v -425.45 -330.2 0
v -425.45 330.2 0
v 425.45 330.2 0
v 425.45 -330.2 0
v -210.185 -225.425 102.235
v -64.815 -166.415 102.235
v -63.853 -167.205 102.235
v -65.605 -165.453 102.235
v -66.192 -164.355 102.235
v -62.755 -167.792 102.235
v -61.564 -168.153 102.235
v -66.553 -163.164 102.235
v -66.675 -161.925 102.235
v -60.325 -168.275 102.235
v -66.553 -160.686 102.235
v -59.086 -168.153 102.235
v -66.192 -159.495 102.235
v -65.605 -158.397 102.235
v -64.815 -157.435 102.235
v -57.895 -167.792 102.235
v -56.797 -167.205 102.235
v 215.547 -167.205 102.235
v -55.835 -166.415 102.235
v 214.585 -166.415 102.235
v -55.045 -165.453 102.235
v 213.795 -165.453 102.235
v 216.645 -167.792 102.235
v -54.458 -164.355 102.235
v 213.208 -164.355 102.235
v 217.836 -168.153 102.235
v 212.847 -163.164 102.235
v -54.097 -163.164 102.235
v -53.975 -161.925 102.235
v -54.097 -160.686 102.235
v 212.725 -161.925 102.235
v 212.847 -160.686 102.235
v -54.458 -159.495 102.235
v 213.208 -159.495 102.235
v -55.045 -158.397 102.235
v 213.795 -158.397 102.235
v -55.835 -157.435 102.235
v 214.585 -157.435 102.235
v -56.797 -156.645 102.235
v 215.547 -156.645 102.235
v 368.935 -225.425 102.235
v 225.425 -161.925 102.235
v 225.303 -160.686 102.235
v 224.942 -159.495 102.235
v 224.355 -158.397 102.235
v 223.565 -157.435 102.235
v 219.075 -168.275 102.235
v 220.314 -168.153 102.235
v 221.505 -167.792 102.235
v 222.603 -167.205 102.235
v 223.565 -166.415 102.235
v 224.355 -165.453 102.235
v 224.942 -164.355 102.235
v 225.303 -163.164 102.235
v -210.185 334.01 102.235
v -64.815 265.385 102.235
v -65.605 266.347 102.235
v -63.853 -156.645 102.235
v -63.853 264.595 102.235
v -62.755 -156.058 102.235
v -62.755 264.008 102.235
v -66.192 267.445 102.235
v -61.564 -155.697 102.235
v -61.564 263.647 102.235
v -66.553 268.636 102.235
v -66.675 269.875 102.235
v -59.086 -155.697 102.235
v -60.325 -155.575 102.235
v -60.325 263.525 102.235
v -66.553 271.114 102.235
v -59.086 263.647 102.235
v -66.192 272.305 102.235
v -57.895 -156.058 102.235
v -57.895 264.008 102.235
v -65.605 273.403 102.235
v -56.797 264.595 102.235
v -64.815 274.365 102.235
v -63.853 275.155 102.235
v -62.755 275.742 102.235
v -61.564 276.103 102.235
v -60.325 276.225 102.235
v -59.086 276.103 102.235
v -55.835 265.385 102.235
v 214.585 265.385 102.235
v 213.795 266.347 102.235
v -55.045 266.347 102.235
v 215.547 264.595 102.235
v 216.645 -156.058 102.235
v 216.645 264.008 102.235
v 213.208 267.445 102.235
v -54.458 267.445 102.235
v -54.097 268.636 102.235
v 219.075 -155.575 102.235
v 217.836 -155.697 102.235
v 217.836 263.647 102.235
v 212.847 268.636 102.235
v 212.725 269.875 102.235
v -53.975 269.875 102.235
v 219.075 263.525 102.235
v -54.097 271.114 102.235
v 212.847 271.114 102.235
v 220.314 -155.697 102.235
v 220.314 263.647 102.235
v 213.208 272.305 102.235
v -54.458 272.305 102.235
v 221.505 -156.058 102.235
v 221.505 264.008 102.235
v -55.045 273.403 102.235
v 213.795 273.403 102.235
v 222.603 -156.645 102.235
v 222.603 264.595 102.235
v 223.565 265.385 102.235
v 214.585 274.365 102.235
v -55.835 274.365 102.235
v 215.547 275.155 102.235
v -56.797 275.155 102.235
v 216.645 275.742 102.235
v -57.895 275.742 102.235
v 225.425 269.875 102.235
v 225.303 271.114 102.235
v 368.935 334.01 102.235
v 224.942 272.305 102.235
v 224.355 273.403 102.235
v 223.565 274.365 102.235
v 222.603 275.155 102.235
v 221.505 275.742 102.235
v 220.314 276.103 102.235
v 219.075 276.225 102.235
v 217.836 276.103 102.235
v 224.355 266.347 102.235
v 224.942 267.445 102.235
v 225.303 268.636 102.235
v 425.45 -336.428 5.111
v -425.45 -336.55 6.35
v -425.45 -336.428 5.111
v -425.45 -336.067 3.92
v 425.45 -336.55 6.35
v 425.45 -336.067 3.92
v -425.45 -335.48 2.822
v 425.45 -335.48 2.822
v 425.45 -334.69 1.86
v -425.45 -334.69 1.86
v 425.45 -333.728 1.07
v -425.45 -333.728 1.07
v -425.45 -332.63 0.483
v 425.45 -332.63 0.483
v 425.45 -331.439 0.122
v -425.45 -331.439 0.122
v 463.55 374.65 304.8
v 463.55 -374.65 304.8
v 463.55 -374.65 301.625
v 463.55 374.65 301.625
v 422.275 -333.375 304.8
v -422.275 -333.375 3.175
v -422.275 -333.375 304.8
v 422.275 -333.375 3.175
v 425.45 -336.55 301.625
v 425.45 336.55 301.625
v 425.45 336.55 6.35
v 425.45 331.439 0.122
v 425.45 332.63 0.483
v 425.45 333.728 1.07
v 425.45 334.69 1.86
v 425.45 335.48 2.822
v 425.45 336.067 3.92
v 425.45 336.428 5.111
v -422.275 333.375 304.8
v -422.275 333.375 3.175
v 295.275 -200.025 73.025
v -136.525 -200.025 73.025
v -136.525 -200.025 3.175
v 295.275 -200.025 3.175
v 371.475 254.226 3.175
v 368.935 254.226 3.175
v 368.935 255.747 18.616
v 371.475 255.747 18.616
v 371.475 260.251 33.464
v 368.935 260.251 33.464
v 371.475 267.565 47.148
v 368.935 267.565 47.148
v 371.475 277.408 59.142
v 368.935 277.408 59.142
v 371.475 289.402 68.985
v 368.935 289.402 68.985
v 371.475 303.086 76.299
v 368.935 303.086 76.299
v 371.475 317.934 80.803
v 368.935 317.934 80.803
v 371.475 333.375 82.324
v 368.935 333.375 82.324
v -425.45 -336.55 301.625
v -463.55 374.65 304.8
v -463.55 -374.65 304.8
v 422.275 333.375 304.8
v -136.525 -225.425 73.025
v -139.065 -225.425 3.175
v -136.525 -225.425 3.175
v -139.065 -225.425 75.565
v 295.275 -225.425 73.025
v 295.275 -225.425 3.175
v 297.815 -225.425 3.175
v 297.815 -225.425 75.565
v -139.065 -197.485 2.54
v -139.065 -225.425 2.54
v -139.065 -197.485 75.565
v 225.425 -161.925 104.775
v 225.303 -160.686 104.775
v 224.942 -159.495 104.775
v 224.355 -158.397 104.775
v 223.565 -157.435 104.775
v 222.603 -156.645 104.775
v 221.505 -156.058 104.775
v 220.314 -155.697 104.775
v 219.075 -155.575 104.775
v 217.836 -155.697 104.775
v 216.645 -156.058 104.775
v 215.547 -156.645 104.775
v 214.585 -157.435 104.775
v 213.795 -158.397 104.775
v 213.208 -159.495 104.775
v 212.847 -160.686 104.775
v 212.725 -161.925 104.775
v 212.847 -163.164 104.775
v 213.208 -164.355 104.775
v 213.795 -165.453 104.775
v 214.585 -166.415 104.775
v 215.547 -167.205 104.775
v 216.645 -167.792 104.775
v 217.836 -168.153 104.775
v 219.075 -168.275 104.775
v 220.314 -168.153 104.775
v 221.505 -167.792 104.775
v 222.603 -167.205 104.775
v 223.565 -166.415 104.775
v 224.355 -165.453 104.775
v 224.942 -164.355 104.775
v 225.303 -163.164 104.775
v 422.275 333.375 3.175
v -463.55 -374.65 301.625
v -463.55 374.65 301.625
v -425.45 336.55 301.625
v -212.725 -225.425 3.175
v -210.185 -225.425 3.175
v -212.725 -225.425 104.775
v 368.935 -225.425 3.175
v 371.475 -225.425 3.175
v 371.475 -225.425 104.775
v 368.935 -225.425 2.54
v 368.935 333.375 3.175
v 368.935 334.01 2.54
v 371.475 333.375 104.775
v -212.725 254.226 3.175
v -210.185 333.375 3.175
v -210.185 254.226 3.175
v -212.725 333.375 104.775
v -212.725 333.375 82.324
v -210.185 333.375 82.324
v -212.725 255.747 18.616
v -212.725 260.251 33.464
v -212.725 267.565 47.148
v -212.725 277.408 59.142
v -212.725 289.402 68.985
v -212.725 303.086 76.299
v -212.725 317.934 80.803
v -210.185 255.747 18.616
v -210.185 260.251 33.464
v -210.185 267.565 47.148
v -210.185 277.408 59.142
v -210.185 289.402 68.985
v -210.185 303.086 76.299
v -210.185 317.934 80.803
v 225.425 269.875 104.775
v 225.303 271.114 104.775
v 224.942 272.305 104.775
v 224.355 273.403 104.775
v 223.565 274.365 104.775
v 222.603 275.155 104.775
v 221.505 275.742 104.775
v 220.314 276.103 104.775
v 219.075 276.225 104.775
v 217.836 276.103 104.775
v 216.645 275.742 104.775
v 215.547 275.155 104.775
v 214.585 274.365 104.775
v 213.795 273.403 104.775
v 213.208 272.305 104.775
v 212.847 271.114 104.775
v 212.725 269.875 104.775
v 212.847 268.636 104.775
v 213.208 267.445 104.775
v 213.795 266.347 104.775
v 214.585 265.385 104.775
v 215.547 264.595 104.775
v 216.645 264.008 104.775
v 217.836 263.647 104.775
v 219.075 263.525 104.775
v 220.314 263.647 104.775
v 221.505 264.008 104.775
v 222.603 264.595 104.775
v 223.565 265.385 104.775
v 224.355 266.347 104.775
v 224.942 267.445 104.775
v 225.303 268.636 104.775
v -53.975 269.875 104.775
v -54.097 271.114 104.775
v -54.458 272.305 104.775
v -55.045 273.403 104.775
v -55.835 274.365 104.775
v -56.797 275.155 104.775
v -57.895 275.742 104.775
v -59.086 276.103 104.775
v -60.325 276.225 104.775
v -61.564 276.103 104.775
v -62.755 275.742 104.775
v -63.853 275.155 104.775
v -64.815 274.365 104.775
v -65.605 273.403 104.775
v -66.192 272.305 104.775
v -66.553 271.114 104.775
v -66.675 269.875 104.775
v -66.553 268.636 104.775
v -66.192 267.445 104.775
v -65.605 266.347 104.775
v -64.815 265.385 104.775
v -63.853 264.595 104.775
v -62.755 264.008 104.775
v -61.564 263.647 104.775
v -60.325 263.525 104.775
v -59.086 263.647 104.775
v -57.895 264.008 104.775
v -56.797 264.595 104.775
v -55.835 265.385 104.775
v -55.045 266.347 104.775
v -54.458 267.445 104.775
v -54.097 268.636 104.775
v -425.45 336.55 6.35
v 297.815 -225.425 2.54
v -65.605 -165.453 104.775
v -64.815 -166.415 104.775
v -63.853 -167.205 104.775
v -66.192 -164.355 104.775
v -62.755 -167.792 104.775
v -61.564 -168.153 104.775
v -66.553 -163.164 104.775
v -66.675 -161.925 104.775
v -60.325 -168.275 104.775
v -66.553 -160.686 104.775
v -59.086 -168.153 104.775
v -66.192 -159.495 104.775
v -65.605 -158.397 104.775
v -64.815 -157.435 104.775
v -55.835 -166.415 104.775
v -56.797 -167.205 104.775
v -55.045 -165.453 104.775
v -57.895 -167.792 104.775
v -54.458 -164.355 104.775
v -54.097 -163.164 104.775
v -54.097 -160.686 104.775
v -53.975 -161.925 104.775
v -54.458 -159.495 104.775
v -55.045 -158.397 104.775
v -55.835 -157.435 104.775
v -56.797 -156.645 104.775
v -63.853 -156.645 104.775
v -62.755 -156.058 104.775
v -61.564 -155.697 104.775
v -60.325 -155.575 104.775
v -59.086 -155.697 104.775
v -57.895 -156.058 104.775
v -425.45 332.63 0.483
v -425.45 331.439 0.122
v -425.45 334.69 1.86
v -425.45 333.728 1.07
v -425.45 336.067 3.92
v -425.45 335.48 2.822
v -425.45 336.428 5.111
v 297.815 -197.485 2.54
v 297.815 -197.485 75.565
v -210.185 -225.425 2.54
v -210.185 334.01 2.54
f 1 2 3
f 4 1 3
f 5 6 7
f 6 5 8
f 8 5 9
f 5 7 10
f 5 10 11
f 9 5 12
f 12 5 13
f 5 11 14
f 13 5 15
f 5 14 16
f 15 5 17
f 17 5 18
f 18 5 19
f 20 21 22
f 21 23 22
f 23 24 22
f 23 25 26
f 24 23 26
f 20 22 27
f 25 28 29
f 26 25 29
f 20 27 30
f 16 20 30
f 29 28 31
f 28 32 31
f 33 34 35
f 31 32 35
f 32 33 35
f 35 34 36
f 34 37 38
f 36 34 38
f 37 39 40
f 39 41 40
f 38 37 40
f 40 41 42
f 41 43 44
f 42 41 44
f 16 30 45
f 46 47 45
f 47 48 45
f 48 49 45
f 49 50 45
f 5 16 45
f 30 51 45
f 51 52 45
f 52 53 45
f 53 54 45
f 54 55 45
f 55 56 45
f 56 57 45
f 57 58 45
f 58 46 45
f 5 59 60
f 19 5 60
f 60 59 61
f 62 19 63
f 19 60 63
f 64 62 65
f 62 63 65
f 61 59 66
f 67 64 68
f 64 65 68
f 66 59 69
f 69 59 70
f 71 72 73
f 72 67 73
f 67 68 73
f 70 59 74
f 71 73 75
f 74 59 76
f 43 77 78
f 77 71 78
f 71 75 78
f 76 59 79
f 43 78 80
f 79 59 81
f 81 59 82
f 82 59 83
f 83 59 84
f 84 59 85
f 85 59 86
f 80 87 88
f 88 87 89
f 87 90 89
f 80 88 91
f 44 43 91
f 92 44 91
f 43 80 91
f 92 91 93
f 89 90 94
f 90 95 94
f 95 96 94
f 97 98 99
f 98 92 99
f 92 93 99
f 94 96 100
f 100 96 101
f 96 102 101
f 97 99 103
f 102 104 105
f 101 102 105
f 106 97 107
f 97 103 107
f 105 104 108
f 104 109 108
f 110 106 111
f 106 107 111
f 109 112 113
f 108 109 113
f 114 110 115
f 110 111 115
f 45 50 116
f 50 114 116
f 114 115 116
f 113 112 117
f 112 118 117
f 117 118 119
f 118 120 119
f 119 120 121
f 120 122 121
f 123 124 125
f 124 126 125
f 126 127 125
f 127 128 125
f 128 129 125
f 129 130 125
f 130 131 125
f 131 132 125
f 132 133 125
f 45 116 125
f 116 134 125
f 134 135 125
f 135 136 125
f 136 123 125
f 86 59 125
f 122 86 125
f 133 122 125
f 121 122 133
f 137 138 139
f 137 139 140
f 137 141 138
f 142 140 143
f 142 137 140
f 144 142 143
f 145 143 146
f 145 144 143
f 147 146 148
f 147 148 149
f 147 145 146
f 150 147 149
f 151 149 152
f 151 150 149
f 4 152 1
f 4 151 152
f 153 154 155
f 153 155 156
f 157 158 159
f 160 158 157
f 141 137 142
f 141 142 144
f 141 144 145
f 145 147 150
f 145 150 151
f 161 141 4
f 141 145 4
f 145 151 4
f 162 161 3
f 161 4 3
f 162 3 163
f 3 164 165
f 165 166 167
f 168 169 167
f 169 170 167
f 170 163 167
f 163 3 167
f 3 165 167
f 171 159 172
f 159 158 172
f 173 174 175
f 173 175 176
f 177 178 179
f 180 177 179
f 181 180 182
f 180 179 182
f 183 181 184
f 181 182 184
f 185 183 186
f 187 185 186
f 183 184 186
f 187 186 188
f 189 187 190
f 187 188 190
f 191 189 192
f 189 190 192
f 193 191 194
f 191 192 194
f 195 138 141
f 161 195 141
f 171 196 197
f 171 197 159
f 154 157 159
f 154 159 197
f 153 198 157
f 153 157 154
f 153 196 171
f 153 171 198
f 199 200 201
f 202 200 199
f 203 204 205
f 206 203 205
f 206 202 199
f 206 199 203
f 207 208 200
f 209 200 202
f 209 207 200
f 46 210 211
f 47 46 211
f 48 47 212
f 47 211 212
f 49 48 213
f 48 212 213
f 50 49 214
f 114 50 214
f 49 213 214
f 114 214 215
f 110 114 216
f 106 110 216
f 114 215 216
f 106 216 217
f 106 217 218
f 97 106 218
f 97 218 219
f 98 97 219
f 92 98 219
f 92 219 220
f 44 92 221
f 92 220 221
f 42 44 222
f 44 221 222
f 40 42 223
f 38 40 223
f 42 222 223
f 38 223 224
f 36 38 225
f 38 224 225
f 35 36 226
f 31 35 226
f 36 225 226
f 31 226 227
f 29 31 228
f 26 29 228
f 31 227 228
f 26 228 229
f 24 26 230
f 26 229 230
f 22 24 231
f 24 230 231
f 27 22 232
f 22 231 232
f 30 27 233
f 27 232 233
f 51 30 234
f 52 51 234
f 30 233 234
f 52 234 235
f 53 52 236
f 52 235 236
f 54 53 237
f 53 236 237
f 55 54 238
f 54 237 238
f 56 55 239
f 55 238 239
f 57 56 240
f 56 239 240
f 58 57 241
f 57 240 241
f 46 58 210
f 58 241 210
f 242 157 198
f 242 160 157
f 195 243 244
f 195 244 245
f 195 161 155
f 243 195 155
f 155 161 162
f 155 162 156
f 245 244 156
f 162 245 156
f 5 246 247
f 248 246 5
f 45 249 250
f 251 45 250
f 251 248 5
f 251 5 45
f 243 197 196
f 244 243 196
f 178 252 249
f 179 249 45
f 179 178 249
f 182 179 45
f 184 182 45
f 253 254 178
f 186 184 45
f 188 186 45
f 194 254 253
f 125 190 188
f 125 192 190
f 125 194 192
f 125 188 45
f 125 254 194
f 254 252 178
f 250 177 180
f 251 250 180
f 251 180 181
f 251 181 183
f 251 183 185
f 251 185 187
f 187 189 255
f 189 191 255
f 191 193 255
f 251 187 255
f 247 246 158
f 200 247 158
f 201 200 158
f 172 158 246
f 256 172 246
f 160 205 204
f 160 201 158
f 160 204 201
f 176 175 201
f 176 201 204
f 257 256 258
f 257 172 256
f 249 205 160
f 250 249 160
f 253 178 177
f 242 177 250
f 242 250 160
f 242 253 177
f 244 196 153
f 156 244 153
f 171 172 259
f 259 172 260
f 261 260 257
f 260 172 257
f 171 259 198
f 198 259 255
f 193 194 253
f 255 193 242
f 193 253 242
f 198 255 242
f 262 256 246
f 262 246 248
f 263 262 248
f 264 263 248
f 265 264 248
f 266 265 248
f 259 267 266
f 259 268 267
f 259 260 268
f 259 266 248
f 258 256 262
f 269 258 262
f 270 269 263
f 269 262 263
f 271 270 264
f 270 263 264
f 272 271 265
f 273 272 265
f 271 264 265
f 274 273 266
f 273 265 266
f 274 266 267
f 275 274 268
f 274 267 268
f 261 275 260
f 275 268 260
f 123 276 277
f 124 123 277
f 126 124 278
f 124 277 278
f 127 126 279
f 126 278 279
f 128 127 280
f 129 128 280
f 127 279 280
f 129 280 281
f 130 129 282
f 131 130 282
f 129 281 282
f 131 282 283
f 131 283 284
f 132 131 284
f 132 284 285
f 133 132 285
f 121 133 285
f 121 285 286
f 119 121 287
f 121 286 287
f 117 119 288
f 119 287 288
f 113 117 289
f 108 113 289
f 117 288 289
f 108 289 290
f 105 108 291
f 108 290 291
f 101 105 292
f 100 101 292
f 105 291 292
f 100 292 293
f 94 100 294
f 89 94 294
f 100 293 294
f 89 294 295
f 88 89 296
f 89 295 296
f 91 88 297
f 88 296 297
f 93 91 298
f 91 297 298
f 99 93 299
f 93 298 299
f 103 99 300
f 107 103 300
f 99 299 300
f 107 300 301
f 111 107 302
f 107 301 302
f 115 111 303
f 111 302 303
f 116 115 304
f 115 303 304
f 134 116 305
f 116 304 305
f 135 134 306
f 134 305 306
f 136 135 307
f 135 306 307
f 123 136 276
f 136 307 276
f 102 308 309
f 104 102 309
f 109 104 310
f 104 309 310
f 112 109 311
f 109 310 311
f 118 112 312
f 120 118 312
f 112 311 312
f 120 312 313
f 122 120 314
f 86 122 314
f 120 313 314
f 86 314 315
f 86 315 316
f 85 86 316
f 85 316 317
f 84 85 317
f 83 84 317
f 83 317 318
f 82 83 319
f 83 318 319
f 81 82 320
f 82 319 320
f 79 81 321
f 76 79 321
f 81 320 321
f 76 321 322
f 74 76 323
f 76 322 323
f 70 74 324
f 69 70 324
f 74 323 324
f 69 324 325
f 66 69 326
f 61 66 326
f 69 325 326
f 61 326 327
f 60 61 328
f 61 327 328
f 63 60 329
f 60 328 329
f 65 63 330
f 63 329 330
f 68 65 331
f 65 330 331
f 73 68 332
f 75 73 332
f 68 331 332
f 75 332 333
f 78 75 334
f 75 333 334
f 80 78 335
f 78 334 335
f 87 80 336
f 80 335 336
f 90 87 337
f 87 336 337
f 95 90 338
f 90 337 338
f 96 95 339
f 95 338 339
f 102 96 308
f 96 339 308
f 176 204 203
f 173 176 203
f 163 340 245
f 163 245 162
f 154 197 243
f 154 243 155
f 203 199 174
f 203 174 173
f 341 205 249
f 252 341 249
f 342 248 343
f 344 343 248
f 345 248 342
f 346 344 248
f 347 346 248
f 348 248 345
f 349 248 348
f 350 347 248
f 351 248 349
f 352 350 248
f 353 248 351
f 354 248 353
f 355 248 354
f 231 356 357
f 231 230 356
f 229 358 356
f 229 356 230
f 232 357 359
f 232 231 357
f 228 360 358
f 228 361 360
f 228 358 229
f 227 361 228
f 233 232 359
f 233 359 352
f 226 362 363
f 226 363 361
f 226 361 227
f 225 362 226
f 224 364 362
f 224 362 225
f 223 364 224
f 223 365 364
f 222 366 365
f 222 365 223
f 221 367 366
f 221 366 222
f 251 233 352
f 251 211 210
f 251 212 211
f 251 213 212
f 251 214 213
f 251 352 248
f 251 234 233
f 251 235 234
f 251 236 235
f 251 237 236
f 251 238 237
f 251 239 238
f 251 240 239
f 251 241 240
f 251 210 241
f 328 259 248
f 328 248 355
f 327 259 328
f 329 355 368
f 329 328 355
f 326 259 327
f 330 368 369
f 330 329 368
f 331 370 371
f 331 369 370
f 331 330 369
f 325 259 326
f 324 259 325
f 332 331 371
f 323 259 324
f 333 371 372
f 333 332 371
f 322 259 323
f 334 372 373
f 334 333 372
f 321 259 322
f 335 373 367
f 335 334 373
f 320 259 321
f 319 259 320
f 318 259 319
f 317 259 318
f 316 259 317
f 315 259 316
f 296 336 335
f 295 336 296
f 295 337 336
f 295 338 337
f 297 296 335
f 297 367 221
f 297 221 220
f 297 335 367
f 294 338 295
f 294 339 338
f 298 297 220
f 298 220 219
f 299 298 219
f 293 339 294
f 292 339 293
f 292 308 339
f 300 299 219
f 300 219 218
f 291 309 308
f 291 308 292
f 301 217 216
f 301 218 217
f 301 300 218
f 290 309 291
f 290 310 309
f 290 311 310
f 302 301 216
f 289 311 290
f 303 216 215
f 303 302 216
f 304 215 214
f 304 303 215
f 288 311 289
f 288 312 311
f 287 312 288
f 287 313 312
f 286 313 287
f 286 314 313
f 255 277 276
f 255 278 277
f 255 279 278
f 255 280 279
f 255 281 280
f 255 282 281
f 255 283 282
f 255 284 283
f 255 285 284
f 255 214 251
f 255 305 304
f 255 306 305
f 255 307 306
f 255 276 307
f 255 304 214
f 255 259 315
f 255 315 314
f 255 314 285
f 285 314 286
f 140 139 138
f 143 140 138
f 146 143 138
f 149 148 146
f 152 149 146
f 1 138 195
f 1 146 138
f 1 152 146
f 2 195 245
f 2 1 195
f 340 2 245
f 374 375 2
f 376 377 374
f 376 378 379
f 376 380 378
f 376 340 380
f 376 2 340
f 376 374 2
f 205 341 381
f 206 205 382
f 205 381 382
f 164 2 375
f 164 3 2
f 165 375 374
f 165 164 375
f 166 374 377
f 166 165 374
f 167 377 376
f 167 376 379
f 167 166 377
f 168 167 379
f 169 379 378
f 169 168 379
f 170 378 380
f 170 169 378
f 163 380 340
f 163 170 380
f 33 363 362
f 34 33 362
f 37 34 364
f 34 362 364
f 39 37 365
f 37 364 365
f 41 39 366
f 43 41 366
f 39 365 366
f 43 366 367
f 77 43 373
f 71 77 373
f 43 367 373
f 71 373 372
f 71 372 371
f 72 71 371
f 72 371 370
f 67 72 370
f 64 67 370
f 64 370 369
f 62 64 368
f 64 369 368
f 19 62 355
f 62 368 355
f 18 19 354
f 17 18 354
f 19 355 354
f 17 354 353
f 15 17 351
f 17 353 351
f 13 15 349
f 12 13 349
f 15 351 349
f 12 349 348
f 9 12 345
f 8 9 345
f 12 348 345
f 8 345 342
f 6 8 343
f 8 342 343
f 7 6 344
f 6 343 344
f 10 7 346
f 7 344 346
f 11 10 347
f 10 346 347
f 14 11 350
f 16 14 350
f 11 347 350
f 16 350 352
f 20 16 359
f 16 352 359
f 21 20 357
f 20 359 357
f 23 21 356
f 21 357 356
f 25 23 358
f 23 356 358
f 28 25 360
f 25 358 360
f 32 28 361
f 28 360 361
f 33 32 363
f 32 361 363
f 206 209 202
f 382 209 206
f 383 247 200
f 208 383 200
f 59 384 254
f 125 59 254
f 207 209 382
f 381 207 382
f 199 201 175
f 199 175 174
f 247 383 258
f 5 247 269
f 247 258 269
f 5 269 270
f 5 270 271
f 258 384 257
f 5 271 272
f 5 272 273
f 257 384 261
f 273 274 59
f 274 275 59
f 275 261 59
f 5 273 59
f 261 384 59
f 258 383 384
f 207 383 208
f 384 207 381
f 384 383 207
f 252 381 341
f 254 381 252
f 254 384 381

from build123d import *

# Parameters (mm, degrees)
F0_W      = 850.9
F0_H      = 673.1
F1_DEPTH  = 304.8
F2_T      = -3.175
F3_W      = 584.2
F3_H      = 101.6
F4_DEPTH  = 558.8
F5_W      = 431.8
F5_H      = 69.85
F6_DEPTH  = 25.4
F7_T      = -2.54
F8_R      = 6.35
F9_DEPTH  = 2.54
F10_W     = 927.1
F10_H     = 749.3
F10_W_2   = 850.9
F10_H_2   = 673.1
F11_DEPTH = 3.175
F12_R     = 6.35
F13_R     = 6.35
F15_DEPTH = 584.2


# Not quite as in the source:
# - a shell that OpenCascade refuses in one call is made with other operations: the cavity is built on its own and cut out


with BuildPart() as f1:
    # F0 (on Top) → F1 (new body)
    with BuildSketch(Plane.XY):
        Rectangle(F0_W, F0_H)
    extrude(amount=F1_DEPTH)

    # F2
    f2_openings = [f1.faces().sort_by_distance(p)[0] for p in [
        (0, 0, 304.8),
    ]]
    offset(amount=F2_T, openings=f2_openings)

    # F3 (on face) → F4 (join)
    with BuildSketch(Plane.XZ.offset(-333.375)):
        with Locations((79.3750111103, 53.975)):
            Rectangle(F3_W, F3_H)
    extrude(amount=F4_DEPTH)

    # F5 (on face) → F6 (cut)
    with BuildSketch(Plane.XZ.offset(225.425)):
        with Locations((79.3750111103, 38.1)):
            Rectangle(F5_W, F5_H)
    extrude(amount=-F6_DEPTH, mode=Mode.SUBTRACT)

    # F7: a shell. OpenCascade refuses it in one call, so the cavity is built on its own and cut out:
    # the body offset inwards by the wall thickness, plus a prism from it out through each open face.
    f7_core = offset(f1.part, amount=F7_T, kind=Kind.INTERSECTION, mode=Mode.PRIVATE)
    f7_exits = [f7_core.faces().sort_by_distance(p)[0] for p in [
        (303.691397, -222.885, 39.0525),
    ]]
    add(f7_core, mode=Mode.SUBTRACT)
    extrude(f7_exits, amount=-F7_T, mode=Mode.SUBTRACT)

    # F8 (on face) → F9 (cut, through all)
    with BuildSketch(Plane.XY.offset(104.775)):
        with Locations((219.0750111103, 269.875)):
            Circle(F8_R)
        with Locations((-60.3249888897, 269.875)):
            Circle(F8_R)
        with Locations((-60.3249888897, -161.925)):
            Circle(F8_R)
        with Locations((219.0750111103, -161.925)):
            Circle(F8_R)
    extrude(amount=-F9_DEPTH, mode=Mode.SUBTRACT)

    # F10 (on face) → F11 (join)
    with BuildSketch(Plane.XY.offset(304.8)):
        Rectangle(F10_W, F10_H)
        Rectangle(F10_W_2, F10_H_2, mode=Mode.SUBTRACT)
    extrude(amount=-F11_DEPTH)

    # F12
    f12_edges = [f1.edges().sort_by_distance(p)[0] for p in [
        (0, -336.55, 0),
    ]]
    fillet(f12_edges, radius=F12_R)

    # F13
    f13_edges = [f1.edges().sort_by_distance(p)[0] for p in [
        (0, 336.55, 0),
    ]]
    fillet(f13_edges, radius=F13_R)

    # F14 (on face) → F15 (cut, through all)
    with BuildSketch(Plane(origin=(-212.7249888897, 0, 0), x_dir=(0, -1, 0), z_dir=(-1, 0, 0))):
        with BuildLine():
            ThreePointArc((-254.2258527756, 3.175), (-277.4081012725, 59.1418987275), (-333.375, 82.3241472244))
            Line((-333.375, 82.3241472244), (-333.375, 3.175))
            Line((-333.375, 3.175), (-254.2258527756, 3.175))
        make_face()
    extrude(amount=-F15_DEPTH, mode=Mode.SUBTRACT)


solid = f1.part
